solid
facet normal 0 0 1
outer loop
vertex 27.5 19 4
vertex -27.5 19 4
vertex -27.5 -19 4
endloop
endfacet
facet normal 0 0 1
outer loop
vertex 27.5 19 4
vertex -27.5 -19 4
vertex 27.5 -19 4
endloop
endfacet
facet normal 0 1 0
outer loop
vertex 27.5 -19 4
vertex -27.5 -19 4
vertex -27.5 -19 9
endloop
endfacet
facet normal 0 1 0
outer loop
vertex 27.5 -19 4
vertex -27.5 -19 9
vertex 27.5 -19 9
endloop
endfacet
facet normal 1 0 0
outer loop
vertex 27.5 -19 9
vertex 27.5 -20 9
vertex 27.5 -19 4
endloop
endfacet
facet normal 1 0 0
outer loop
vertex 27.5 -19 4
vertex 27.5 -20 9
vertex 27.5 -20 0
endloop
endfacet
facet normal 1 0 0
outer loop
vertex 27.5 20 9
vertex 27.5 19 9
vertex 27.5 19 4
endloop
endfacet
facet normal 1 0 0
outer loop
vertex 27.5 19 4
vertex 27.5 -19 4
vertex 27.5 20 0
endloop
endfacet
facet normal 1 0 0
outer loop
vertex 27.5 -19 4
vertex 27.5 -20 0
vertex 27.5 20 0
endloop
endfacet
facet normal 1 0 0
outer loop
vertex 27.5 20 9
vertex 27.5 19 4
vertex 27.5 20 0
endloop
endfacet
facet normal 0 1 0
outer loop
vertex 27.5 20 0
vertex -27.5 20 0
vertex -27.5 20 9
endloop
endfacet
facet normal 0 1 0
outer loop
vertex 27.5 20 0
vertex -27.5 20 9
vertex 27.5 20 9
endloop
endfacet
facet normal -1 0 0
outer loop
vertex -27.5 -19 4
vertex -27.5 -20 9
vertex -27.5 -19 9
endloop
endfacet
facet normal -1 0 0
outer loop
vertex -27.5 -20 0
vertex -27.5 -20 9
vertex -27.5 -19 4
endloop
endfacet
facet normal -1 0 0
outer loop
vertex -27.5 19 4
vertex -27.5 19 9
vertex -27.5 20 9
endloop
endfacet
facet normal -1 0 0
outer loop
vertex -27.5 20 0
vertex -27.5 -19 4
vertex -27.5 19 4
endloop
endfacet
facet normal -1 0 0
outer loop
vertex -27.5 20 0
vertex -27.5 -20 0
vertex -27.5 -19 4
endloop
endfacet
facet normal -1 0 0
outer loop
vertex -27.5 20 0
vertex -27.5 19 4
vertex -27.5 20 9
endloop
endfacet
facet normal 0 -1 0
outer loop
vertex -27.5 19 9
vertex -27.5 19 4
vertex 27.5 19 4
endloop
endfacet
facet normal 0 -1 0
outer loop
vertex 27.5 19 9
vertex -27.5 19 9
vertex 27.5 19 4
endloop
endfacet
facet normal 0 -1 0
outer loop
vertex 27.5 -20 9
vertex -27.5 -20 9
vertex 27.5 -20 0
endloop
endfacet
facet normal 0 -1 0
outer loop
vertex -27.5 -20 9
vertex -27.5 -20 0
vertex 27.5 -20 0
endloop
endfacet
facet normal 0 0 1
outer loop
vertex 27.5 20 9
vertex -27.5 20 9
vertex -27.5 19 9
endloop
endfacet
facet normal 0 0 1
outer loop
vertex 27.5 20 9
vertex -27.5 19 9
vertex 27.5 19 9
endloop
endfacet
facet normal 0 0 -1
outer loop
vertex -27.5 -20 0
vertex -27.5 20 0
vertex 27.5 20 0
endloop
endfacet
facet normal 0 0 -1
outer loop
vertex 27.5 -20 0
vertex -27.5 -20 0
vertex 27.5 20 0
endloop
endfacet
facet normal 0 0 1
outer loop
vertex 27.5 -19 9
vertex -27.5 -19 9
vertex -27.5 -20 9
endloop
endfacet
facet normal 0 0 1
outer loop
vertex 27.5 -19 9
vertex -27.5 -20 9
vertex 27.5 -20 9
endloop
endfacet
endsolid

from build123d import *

# Parameters (mm, degrees)
F0_W     = 55
F0_H     = 40
F1_DEPTH = 4
F2_W     = 55
F2_H     = 1
F3_DEPTH = 5
F4_W     = 55
F4_H     = 1
F5_DEPTH = 5


# Not quite as in the source:
# - the program builds the solid bodies; features that only make, move or delete a surface that nothing else refers to are left out


with BuildPart() as f1:
    # F0 (on Top) → F1 (new body)
    with BuildSketch(Plane.XY):
        Rectangle(F0_W, F0_H)
    extrude(amount=F1_DEPTH)

    # F2 (on face) → F3 (join)
    with BuildSketch(Plane.XY.offset(4)):
        with Locations((0, -19.5)):
            Rectangle(F2_W, F2_H)
    extrude(amount=F3_DEPTH)

    # F4 (on face) → F5 (join)
    with BuildSketch(Plane.XY.offset(4)):
        with Locations((0, 19.5)):
            Rectangle(F4_W, F4_H)
    extrude(amount=F5_DEPTH)


solid = f1.part
